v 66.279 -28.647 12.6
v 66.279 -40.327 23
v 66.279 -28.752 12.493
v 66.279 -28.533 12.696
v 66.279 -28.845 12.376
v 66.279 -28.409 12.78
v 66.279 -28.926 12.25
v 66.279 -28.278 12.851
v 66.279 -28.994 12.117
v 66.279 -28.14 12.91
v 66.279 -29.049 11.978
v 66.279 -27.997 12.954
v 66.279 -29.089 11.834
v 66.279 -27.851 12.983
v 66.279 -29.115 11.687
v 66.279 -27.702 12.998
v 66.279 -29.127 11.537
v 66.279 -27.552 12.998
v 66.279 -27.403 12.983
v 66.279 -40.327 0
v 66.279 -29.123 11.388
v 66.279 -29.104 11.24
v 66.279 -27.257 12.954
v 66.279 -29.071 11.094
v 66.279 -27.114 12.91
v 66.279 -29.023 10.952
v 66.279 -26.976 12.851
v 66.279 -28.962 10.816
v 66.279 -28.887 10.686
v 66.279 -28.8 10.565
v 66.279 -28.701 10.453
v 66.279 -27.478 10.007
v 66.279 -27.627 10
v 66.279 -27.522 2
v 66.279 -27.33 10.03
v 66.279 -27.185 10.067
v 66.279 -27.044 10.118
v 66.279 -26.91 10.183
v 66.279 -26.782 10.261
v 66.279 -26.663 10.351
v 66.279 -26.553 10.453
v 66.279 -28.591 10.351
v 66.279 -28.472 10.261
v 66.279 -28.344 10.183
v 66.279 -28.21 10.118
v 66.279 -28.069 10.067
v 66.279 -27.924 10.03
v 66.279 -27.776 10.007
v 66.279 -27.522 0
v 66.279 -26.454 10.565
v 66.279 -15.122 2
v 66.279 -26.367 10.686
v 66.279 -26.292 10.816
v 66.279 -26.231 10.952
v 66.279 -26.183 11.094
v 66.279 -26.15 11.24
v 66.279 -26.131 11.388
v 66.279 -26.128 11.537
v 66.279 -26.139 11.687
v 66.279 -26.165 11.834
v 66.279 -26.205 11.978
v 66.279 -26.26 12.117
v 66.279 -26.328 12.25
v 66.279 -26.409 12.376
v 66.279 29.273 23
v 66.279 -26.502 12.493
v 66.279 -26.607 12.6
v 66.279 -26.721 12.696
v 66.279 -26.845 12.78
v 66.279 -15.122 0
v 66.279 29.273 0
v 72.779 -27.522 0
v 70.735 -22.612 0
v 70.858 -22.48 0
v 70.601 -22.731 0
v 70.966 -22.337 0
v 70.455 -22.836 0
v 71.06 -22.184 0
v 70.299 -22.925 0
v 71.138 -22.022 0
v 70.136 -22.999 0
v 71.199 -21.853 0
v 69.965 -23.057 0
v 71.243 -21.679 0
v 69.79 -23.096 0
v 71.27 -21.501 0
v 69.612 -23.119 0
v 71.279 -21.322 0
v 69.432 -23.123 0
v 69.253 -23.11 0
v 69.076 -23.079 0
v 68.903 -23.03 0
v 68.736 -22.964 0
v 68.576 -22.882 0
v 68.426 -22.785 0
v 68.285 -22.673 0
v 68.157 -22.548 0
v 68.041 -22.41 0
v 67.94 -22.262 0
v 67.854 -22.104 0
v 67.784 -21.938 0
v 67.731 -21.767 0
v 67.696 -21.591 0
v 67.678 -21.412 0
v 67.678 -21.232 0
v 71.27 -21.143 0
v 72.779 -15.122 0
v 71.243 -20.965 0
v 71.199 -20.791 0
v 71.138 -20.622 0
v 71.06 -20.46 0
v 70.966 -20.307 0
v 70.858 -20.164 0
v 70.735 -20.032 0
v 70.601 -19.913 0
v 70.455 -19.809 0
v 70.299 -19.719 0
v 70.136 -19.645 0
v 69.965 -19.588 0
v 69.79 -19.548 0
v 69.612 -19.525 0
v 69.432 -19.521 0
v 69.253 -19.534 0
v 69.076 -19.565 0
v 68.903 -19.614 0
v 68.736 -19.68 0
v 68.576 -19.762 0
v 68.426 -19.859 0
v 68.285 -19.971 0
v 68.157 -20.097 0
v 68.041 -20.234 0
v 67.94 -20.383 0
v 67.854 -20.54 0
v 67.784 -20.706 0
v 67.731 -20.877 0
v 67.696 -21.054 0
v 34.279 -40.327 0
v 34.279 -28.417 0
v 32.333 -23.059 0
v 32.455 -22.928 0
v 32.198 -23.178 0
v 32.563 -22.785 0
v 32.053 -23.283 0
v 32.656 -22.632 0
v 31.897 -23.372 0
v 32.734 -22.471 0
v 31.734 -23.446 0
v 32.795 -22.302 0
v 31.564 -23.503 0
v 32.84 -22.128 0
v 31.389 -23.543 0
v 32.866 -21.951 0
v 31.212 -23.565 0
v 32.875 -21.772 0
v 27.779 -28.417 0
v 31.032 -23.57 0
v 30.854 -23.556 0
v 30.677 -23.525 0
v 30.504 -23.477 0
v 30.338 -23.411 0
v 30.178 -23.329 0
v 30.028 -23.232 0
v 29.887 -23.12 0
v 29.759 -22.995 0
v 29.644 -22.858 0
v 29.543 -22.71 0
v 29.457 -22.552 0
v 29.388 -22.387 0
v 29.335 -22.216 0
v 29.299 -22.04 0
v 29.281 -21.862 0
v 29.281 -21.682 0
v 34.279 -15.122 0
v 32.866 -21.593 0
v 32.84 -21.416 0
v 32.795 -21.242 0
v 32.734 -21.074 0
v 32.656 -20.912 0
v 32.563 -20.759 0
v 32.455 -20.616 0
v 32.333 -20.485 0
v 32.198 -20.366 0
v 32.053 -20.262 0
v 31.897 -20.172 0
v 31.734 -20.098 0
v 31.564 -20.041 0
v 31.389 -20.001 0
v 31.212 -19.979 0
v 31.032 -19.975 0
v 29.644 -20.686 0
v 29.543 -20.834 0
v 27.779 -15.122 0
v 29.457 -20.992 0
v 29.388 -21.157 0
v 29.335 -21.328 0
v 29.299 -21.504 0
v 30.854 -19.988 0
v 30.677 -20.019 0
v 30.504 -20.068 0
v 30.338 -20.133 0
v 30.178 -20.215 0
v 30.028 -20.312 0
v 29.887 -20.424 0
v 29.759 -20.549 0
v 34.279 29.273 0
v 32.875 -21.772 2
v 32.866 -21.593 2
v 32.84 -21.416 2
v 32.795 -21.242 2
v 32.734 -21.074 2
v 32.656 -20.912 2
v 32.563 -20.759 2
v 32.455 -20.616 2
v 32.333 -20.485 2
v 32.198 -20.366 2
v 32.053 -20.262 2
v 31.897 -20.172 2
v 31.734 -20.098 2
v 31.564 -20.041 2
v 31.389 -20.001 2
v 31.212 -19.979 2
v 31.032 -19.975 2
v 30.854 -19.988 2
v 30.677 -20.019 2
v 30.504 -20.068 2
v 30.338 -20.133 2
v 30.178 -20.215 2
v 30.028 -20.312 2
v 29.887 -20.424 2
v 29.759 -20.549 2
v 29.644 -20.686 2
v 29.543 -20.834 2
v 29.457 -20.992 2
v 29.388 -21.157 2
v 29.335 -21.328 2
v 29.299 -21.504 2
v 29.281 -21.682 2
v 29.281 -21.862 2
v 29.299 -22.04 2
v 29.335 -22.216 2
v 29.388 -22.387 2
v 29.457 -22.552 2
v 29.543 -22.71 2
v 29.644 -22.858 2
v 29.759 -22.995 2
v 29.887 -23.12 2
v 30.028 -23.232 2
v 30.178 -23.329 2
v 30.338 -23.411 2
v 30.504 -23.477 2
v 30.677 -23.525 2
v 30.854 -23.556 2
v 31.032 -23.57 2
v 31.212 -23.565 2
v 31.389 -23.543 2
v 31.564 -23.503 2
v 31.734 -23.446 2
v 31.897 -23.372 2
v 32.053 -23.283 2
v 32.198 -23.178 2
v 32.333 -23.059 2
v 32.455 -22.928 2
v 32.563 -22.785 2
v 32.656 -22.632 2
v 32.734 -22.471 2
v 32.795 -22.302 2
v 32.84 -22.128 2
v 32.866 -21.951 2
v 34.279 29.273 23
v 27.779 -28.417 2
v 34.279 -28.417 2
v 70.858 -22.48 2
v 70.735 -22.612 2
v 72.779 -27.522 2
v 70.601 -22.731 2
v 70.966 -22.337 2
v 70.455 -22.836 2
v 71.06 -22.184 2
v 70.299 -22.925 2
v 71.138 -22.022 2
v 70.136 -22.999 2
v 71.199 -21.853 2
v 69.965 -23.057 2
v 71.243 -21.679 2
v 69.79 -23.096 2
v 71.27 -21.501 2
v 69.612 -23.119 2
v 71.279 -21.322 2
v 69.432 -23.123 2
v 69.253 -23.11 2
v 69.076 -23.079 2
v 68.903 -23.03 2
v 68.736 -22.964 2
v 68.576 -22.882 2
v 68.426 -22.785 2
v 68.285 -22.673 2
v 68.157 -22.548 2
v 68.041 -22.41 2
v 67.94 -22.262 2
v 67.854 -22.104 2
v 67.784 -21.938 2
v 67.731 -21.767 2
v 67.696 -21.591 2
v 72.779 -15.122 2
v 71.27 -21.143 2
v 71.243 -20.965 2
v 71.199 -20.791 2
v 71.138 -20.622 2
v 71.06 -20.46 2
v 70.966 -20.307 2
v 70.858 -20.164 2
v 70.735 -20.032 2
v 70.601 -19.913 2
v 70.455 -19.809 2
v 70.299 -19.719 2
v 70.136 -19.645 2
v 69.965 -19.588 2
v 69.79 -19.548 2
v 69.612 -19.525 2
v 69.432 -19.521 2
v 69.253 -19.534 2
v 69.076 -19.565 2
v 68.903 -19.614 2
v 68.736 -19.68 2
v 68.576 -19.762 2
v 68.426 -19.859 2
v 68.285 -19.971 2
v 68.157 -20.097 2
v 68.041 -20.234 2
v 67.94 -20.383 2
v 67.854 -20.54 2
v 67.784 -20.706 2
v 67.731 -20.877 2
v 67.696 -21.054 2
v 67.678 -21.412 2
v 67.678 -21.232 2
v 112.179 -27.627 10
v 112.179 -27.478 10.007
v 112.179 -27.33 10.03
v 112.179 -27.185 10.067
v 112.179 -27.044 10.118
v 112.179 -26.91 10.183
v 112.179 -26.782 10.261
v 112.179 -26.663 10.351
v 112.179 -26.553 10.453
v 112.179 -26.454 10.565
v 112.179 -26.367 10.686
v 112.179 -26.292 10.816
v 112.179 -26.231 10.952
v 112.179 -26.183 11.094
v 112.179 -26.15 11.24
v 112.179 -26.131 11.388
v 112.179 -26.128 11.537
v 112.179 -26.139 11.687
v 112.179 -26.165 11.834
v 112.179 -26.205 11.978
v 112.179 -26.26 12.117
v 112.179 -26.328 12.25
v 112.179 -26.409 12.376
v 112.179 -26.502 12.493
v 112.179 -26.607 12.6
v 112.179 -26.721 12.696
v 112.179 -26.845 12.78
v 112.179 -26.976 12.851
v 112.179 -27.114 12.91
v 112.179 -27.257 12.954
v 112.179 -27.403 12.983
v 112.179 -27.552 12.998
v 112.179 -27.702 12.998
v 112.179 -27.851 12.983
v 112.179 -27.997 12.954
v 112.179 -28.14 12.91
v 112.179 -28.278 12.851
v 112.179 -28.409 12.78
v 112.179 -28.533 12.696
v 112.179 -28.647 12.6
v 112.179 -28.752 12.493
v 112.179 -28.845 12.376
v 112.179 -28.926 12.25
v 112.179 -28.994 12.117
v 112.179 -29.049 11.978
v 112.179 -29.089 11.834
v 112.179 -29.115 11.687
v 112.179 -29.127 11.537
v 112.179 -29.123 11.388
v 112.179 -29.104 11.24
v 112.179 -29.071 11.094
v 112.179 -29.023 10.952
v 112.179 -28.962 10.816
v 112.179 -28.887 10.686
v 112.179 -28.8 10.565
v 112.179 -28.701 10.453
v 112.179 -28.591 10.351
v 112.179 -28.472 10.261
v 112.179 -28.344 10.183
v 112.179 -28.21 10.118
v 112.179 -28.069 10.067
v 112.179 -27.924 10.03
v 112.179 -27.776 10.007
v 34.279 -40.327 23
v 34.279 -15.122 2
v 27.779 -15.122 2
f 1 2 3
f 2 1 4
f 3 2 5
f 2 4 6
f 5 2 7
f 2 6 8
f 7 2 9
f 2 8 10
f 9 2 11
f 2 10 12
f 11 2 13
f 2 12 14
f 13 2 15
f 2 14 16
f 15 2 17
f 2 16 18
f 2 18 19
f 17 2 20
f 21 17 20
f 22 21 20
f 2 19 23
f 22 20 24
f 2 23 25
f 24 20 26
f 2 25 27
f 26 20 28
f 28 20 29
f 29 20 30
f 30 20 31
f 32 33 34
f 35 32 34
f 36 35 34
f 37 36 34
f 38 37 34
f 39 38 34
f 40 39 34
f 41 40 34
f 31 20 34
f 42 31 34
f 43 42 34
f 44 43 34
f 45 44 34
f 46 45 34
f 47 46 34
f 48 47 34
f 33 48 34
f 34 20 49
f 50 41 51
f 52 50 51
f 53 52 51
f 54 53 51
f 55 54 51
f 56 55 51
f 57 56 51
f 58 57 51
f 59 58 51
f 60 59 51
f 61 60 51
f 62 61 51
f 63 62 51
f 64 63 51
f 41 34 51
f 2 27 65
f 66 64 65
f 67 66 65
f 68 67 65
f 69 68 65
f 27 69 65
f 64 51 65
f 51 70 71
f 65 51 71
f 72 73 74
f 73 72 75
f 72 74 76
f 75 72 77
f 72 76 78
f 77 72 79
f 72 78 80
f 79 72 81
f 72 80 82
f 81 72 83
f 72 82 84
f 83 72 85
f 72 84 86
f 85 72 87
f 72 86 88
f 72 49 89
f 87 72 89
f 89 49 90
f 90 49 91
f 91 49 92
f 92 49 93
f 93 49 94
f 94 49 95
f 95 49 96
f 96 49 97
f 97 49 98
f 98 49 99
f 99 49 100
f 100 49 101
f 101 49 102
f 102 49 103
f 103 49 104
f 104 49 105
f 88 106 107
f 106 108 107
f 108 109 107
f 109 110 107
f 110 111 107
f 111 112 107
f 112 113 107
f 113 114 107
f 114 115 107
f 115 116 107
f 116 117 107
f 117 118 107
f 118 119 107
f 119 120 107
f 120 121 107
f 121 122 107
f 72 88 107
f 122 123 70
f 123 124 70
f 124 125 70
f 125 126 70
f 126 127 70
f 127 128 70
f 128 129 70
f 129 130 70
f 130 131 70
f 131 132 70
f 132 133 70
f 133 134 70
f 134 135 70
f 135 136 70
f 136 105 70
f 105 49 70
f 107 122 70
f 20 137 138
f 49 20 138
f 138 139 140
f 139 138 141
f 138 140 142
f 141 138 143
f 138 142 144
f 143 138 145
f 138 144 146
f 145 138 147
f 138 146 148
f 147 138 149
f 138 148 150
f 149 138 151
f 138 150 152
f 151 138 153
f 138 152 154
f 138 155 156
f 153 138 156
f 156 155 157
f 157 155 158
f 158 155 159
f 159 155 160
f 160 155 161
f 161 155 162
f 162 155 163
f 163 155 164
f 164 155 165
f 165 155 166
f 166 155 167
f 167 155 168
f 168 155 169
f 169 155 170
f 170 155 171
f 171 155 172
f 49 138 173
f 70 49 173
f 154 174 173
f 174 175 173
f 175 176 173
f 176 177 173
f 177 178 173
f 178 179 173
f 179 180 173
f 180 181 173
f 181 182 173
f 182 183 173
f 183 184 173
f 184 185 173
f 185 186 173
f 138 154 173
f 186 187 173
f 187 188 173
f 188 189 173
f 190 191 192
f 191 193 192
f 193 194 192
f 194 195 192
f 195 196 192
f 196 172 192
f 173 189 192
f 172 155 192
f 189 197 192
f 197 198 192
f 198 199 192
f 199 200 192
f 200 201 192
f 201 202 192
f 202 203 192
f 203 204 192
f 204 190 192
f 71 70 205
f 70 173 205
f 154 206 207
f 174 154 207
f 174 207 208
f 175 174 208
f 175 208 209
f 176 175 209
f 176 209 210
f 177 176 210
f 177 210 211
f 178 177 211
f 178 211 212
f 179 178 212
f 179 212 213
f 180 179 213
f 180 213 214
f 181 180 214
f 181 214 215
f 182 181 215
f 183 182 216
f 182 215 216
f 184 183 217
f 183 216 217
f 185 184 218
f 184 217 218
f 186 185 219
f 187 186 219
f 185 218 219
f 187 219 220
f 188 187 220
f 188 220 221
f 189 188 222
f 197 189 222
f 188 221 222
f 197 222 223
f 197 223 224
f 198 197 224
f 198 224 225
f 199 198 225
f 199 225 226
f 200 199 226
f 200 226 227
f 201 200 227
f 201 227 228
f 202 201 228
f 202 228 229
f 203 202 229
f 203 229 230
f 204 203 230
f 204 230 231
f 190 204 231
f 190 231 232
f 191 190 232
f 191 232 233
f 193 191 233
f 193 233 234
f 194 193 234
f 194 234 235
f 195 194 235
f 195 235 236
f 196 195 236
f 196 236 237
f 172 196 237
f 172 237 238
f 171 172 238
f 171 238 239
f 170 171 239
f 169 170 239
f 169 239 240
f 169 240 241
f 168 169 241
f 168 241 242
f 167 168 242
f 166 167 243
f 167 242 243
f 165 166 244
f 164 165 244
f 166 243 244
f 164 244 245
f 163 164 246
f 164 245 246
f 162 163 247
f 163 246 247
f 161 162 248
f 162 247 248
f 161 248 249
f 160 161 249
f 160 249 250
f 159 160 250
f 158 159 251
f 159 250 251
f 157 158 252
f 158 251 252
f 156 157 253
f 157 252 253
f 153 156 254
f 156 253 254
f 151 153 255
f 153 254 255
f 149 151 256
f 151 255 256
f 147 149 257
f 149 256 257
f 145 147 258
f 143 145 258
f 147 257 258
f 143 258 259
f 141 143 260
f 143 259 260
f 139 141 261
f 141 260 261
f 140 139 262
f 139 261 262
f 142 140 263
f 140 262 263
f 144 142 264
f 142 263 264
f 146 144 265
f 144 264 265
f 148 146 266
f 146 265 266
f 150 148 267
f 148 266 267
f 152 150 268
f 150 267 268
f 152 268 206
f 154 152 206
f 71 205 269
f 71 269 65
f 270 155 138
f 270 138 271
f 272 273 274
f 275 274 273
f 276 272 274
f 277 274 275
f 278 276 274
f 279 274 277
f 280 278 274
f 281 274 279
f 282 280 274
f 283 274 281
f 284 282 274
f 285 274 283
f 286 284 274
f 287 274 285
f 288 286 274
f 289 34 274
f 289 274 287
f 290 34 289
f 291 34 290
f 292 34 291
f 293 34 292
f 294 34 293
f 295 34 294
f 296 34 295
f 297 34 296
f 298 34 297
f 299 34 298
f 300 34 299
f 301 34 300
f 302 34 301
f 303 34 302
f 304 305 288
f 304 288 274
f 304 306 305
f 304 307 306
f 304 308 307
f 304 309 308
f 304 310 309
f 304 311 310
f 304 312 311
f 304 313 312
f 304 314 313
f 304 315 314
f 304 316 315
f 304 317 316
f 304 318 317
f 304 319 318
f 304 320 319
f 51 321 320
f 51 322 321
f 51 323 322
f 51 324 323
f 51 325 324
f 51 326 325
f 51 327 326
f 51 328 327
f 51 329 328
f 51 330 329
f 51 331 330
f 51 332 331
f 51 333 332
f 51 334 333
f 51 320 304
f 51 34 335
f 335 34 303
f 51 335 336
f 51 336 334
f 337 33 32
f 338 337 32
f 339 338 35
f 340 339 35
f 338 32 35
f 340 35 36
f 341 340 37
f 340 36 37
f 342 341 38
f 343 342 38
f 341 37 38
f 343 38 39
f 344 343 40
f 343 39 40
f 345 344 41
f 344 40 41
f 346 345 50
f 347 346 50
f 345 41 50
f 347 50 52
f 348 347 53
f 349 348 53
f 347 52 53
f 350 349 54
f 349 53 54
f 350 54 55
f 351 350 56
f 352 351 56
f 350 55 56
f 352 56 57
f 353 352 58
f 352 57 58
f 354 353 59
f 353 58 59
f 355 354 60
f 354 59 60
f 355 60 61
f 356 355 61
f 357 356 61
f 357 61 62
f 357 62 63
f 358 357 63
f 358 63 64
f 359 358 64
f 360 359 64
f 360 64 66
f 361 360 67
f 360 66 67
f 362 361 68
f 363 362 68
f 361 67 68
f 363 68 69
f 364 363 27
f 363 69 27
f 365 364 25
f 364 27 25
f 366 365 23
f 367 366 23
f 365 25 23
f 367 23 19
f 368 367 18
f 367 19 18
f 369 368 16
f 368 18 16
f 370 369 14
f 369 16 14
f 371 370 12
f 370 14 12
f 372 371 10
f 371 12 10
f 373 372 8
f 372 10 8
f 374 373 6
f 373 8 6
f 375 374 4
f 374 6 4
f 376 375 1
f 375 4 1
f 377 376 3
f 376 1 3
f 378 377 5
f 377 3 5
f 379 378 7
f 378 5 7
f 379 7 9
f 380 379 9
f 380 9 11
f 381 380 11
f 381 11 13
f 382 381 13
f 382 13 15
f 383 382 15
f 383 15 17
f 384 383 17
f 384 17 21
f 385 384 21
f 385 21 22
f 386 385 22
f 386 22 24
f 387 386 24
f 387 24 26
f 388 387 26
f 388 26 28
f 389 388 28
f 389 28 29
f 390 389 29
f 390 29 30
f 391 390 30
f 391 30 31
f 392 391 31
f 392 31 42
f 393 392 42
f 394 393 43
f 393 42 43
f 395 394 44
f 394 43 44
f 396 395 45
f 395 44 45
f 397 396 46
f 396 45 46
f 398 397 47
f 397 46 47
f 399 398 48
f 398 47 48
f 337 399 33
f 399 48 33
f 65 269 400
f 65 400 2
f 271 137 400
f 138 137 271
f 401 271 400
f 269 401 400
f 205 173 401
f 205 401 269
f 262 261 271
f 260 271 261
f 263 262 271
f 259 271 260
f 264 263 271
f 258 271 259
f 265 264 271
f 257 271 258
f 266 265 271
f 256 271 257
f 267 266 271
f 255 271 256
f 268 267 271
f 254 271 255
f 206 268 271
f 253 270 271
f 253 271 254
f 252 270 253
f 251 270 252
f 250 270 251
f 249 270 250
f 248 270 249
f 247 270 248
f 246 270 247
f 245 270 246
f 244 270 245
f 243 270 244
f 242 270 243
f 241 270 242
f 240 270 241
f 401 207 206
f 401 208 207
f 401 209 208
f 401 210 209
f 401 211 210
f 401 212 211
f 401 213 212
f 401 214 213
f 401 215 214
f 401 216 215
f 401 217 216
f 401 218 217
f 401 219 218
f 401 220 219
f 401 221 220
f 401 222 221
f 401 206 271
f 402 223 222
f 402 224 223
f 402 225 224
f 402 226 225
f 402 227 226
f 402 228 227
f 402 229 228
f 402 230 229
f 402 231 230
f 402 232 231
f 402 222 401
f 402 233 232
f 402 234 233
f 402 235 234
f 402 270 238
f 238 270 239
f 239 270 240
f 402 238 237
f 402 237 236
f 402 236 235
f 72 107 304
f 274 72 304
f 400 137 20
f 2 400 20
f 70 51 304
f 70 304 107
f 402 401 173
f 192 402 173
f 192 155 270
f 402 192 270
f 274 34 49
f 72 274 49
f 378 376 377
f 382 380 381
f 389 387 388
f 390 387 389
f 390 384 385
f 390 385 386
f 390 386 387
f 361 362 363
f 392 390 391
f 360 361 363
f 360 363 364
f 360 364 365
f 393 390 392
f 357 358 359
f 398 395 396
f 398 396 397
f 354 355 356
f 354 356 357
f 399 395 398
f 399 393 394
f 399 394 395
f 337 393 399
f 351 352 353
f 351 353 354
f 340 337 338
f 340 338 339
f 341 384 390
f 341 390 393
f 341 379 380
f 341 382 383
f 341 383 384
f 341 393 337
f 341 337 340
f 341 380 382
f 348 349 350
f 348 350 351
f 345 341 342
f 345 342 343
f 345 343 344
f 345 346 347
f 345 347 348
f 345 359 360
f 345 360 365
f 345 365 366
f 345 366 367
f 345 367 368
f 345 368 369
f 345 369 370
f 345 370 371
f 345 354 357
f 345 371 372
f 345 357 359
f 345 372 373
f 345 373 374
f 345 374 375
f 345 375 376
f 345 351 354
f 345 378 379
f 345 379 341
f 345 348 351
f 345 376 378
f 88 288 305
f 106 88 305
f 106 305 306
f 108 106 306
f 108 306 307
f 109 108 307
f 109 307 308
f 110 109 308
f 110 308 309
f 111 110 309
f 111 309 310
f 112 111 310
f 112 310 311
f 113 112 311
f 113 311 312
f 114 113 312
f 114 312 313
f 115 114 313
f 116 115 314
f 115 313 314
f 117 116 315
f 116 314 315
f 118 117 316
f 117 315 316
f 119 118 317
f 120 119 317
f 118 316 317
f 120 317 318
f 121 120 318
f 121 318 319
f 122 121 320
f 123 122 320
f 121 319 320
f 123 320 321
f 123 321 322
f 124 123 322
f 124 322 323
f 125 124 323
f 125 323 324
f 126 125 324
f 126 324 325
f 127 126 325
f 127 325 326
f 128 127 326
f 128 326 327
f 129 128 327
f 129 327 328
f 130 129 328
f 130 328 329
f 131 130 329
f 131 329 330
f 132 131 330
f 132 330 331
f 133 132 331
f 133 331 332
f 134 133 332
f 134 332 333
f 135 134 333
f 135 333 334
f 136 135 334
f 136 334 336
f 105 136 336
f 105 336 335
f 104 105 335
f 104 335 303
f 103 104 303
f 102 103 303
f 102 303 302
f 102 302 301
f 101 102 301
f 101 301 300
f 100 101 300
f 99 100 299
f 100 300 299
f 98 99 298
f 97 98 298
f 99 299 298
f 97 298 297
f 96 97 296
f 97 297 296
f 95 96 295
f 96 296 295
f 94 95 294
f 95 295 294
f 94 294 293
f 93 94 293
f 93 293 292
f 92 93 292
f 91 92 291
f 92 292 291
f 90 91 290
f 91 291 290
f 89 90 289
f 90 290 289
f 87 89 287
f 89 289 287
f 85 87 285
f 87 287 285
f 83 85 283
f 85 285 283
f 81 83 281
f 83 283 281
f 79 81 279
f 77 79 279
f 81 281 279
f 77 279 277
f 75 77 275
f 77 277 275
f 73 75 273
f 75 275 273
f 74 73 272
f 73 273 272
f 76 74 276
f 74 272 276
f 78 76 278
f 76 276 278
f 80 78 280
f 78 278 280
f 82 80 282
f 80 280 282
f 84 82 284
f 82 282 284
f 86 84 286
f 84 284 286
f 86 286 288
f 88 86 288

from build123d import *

# Parameters (mm, degrees)
SKETCH_1_W          = 32
SKETCH_1_H          = 69.6
EXTRUDE_1_DEPTH     = 23
SKETCH_2_R          = 1.5
EXTRUDE_2_DEPTH     = 45.9
SKETCH_3_W          = 2
SKETCH_3_H          = 3.6
EXTRUDE_3_DEPTH     = 4.5
SKETCH_5_W          = 16
SKETCH_5_H          = 23
CUT_EXTRUDE_1_DEPTH = 71.5
SKETCH_6_W          = 4.5
SKETCH_6_H          = 3.6
CUT_EXTRUDE_2_DEPTH = 1
SKETCH_7_W          = 2
SKETCH_7_H          = 4.4
EXTRUDE_4_DEPTH     = 6.5
SKETCH_9_W          = 1
SKETCH_9_H          = 1.8
CUT_EXTRUDE_3_DEPTH = 4.5
SKETCH_10_W         = 1.5
SKETCH_10_H         = 2
EXTRUDE_5_DEPTH     = 4.5
SKETCH_12_W         = 2
SKETCH_12_H         = 4.395113111
EXTRUDE_6_DEPTH     = 7.5
SKETCH_15_W         = 2
SKETCH_15_H         = 3.6
EXTRUDE_7_DEPTH     = 6
SKETCH_14_R         = 1.801767182
CUT_EXTRUDE_4_DEPTH = 6
SKETCH_17_W         = 2
SKETCH_17_H         = 4.5
EXTRUDE_8_DEPTH     = 6
SKETCH_16_R         = 1.798109405
CUT_EXTRUDE_5_DEPTH = 6
SKETCH_18_R         = 1.5
CUT_EXTRUDE_6_DEPTH = 45.9


with BuildPart() as part:
    # ｽｹｯﾁ1 → ﾎﾞｽ - 押し出し1 (new body)
    with BuildSketch(Plane.XY):
        with Locations((50.279062003, -5.527058824)):
            Rectangle(SKETCH_1_W, SKETCH_1_H)
    extrude_1 = extrude(amount=EXTRUDE_1_DEPTH)

    # ｽｹｯﾁ2 → ﾎﾞｽ - 押し出し2 (add)
    with BuildSketch(Plane(origin=(66.279062003, 0, 0), x_dir=(0, 0, -1), z_dir=(1, 0, 0))):
        with Locations((-11.5, -27.627058824)):
            Circle(SKETCH_2_R)
    extrude_2 = extrude(amount=EXTRUDE_2_DEPTH)

    # ｽｹｯﾁ3 → ﾎﾞｽ - 押し出し3 (add)
    with BuildSketch(Plane(origin=(66.279062003, 0, 0), x_dir=(0, 0, -1), z_dir=(1, 0, 0))):
        with Locations((-1, -21.322089651)):
            Rectangle(SKETCH_3_W, SKETCH_3_H)
    extrude(amount=EXTRUDE_3_DEPTH)

    # ｽｹｯﾁ5 → ｶｯﾄ - 押し出し1 (cut)
    with BuildSketch(Plane(origin=(0, 29.272941176, 0), x_dir=(1, 0, 0), z_dir=(0, 1, 0))):
        with Locations((42.279062003, -11.5)):
            Rectangle(SKETCH_5_W, SKETCH_5_H)
    extrude(amount=-CUT_EXTRUDE_1_DEPTH, mode=Mode.SUBTRACT)

    # ｽｹｯﾁ6 → ｶｯﾄ - 押し出し2 (cut)
    with BuildSketch(Plane.XY.offset(2)):
        with Locations((68.529062003, -21.322089651)):
            Rectangle(SKETCH_6_W, SKETCH_6_H)
    extrude(amount=-CUT_EXTRUDE_2_DEPTH, mode=Mode.SUBTRACT)

    # ｽｹｯﾁ7 → ﾎﾞｽ - 押し出し4 (add)
    with BuildSketch(Plane(origin=(66.279062003, 0, 0), x_dir=(0, 0, -1), z_dir=(1, 0, 0))):
        with Locations((-1, -17.322089651)):
            Rectangle(SKETCH_7_W, SKETCH_7_H)
    extrude_4 = extrude(amount=EXTRUDE_4_DEPTH)

    # ｽｹｯﾁ9 → ｶｯﾄ - 押し出し3 (cut)
    with BuildSketch(Plane(origin=(70.779062003, 0, 0), x_dir=(0, 0, -1), z_dir=(1, 0, 0))):
        with Locations((-0.5, -22.222089651)):
            Rectangle(SKETCH_9_W, SKETCH_9_H)
    cut_extrude_3 = extrude(amount=-CUT_EXTRUDE_3_DEPTH, mode=Mode.SUBTRACT)

    # ﾐﾗｰ4: ﾎﾞｽ - 押し出し4, ｶｯﾄ - 押し出し3 across plane
    add(extrude_4.mirror(Plane(origin=(66.279062003, -21.322089651, 1), x_dir=(0, 0, 1), z_dir=(0, 1, 0))))
    add(cut_extrude_3.mirror(Plane(origin=(66.279062003, -21.322089651, 1), x_dir=(0, 0, 1), z_dir=(0, 1, 0))), mode=Mode.SUBTRACT)

    # ｽｹｯﾁ10 → ﾎﾞｽ - 押し出し5 (add)
    with BuildSketch(Plane.XZ.offset(19.522089651)):
        with Locations((72.029062003, 1)):
            Rectangle(SKETCH_10_W, SKETCH_10_H)
    extrude_5 = extrude(amount=EXTRUDE_5_DEPTH)

    # ﾐﾗｰ25: ﾎﾞｽ - 押し出し1, ﾎﾞｽ - 押し出し2, ﾎﾞｽ - 押し出し4, ﾎﾞｽ - 押し出し5 across plane
    add(extrude_1.mirror(Plane(origin=(50.279062003, -42.227058824, 0), x_dir=(0, 0, 1), z_dir=(1, 0, 0))))
    add(extrude_2.mirror(Plane(origin=(50.279062003, -42.227058824, 0), x_dir=(0, 0, 1), z_dir=(1, 0, 0))))
    add(extrude_4.mirror(Plane(origin=(50.279062003, -42.227058824, 0), x_dir=(0, 0, 1), z_dir=(1, 0, 0))))
    add(extrude_5.mirror(Plane(origin=(50.279062003, -42.227058824, 0), x_dir=(0, 0, 1), z_dir=(1, 0, 0))))

    # ｽｹｯﾁ12 → ﾎﾞｽ - 押し出し6 (add)
    with BuildSketch(Plane.ZY.offset(-27.779062003)):
        with Locations((1, -26.219646207)):
            Rectangle(SKETCH_12_W, SKETCH_12_H)
    extrude(amount=-EXTRUDE_6_DEPTH)

    # ｽｹｯﾁ15 → ﾎﾞｽ - 押し出し7 (add)
    with BuildSketch(Plane(origin=(66.279062003, 0, 0), x_dir=(0, 0, -1), z_dir=(1, 0, 0))):
        with Locations((-1, -21.322089651)):
            Rectangle(SKETCH_15_W, SKETCH_15_H)
    extrude(amount=EXTRUDE_7_DEPTH)

    # ｽｹｯﾁ14 → ｶｯﾄ - 押し出し4 (cut)
    with BuildSketch(Plane.XY.offset(2)):
        with Locations((69.477294821, -21.322089651)):
            Circle(SKETCH_14_R)
    extrude(amount=-CUT_EXTRUDE_4_DEPTH, mode=Mode.SUBTRACT)

    # ｽｹｯﾁ17 → ﾎﾞｽ - 押し出し8 (add)
    with BuildSketch(Plane.ZY.offset(-34.279062003)):
        with Locations((1, -21.772089651)):
            Rectangle(SKETCH_17_W, SKETCH_17_H)
    extrude(amount=EXTRUDE_8_DEPTH)

    # ｽｹｯﾁ16 → ｶｯﾄ - 押し出し5 (cut)
    with BuildSketch(Plane.XY.offset(2)):
        with Locations((31.077171408, -21.772089651)):
            Circle(SKETCH_16_R)
    extrude(amount=-CUT_EXTRUDE_5_DEPTH, mode=Mode.SUBTRACT)

    # ｽｹｯﾁ18 → ｶｯﾄ - 押し出し6 (cut)
    with BuildSketch(Plane.ZY.offset(11.620937997)):
        with Locations((11.5, -27.627058824)):
            Circle(SKETCH_18_R)
    extrude(amount=-CUT_EXTRUDE_6_DEPTH, mode=Mode.SUBTRACT)


solid = part.part
